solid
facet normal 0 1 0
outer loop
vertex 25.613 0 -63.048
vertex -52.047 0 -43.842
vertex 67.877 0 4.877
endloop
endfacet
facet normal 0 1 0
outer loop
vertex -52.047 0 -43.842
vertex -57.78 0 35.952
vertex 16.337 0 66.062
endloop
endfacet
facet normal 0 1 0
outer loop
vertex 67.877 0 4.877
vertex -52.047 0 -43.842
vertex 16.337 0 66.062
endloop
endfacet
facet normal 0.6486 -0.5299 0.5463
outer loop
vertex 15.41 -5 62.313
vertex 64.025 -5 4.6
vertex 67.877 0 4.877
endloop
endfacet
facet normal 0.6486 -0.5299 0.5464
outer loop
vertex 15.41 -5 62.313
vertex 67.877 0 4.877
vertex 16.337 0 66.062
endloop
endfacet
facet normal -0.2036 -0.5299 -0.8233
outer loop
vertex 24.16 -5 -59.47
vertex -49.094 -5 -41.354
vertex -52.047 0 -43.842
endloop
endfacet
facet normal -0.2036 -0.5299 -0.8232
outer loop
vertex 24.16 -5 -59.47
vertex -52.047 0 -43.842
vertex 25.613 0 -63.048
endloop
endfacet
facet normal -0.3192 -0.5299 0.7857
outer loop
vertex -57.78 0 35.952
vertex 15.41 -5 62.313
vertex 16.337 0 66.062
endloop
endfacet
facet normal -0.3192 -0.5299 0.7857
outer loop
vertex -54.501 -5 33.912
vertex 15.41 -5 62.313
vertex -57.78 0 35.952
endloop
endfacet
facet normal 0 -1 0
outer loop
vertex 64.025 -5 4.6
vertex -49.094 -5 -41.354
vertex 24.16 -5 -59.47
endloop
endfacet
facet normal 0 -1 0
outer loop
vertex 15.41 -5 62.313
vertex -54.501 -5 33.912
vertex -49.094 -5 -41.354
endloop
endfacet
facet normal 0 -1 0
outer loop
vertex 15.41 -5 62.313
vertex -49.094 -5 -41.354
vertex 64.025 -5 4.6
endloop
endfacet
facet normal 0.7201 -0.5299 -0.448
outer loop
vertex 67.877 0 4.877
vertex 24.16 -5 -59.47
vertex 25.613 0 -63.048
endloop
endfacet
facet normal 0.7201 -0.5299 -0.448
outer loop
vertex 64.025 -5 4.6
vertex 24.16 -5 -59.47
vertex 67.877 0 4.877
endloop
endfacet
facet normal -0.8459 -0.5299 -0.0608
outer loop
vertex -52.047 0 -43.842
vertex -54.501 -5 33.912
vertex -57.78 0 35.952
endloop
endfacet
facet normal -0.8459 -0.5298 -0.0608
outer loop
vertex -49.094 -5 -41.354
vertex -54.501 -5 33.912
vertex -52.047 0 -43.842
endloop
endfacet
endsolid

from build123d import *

# Parameters (mm, degrees)
F1_DEPTH = 5
F2_SIZE2 = 3.124337
F2_SIZE  = 4.99999


# Not quite as in the source:
# - a fillet or chamfer is up to 0.001 mm smaller than in the source, because OpenCascade refuses the exact size


with BuildPart() as f1:
    # F0 (on Front) → F1 (new body)
    with BuildSketch(Plane.XZ):
        Polygon((-57.7801036188, 35.9519558773), (-52.0473758656, -43.8423787117), (25.6130563086, -63.0480360688), (67.8771152201, 4.8765494973), (16.3373079557, 66.061909406), align=None)
    extrude(amount=F1_DEPTH)

    # F2 (size 5 and 3.1243467595 in the source; OpenCascade refuses exactly that, so slightly less here)
    f2_edges = [f1.edges().sort_by_distance(p)[0] for p in [
        (-54.91374, -5, -3.945211),
        (-20.721398, -5, 51.006933),
        (42.107212, -5, 35.469229),
        (46.745086, -5, -29.085743),
        (-13.21716, -5, -53.445207),
    ]]
    chamfer(f2_edges, length=F2_SIZE, length2=F2_SIZE2)


solid = f1.part
